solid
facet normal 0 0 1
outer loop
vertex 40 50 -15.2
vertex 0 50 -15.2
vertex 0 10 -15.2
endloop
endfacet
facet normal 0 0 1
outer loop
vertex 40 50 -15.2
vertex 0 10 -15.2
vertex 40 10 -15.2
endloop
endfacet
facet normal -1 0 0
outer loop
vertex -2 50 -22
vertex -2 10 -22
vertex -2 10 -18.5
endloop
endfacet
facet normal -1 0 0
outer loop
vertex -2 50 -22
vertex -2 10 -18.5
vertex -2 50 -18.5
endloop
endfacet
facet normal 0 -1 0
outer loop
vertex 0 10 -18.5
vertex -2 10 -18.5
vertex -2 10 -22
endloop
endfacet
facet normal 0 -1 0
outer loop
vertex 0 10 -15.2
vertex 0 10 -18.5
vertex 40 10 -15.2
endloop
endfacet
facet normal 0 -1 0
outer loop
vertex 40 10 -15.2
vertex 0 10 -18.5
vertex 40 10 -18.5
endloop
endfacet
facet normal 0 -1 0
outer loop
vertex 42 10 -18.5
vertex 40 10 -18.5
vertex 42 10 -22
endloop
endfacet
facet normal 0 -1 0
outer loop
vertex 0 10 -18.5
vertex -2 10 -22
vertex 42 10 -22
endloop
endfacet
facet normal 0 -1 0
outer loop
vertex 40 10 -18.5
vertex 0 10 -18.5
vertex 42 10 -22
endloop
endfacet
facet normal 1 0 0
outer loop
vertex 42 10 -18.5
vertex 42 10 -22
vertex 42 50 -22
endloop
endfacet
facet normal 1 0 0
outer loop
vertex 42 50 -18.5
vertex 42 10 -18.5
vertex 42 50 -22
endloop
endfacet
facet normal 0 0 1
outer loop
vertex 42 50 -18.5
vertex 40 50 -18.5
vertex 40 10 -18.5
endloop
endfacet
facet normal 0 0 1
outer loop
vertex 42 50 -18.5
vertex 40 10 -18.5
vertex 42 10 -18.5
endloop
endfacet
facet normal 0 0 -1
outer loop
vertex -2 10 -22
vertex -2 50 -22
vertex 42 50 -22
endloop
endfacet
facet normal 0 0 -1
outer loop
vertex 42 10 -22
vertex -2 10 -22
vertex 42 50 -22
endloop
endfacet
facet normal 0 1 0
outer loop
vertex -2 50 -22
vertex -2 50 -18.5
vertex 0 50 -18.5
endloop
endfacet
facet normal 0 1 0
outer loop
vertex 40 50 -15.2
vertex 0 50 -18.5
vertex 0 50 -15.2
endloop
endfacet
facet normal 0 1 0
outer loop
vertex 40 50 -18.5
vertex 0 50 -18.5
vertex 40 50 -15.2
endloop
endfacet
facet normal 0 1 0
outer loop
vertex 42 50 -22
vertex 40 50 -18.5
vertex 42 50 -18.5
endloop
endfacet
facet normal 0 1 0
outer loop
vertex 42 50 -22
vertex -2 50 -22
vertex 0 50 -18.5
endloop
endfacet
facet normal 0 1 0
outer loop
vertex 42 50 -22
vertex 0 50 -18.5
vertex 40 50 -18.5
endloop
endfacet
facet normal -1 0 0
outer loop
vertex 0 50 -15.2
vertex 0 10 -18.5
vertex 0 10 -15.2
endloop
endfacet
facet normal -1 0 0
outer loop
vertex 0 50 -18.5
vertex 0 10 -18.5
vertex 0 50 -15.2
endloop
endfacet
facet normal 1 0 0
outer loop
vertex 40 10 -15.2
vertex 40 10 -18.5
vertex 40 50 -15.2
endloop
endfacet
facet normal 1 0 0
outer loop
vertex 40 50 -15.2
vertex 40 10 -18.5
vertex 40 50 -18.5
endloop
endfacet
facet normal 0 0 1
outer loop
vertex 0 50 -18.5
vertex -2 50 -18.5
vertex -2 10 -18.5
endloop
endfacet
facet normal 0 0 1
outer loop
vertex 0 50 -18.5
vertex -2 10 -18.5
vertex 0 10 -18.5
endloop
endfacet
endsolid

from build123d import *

# Parameters (mm, degrees)
BOX003_W     = 44
BOX003_H     = 40
BOX003_DEPTH = 3.5
BOX002_W     = 40
BOX002_H     = 40
BOX002_DEPTH = 3.3


with BuildPart() as radiator:
    # Box003 → Box003 (new body)
    with BuildSketch(Plane(origin=(-2, 0, -3.5), x_dir=(1, 0, 0), z_dir=(0, 0, 1))):
        with Locations((22, 20)):
            Rectangle(BOX003_W, BOX003_H)
    extrude(amount=BOX003_DEPTH)


with BuildPart() as peltier_and_radiator:
    # Box002 → Box002 (new body)
    with BuildSketch(Plane.XY):
        with Locations((20, 20)):
            Rectangle(BOX002_W, BOX002_H)
    extrude(amount=BOX002_DEPTH)

    # Fusion003: union radiator
    add(radiator.part)


with BuildPart() as peltier_and_radiator_1:
    # Fusion003 placement: moved
    add(peltier_and_radiator.part.moved(Location((0, 10, -18.5))))


solid = peltier_and_radiator_1.part
